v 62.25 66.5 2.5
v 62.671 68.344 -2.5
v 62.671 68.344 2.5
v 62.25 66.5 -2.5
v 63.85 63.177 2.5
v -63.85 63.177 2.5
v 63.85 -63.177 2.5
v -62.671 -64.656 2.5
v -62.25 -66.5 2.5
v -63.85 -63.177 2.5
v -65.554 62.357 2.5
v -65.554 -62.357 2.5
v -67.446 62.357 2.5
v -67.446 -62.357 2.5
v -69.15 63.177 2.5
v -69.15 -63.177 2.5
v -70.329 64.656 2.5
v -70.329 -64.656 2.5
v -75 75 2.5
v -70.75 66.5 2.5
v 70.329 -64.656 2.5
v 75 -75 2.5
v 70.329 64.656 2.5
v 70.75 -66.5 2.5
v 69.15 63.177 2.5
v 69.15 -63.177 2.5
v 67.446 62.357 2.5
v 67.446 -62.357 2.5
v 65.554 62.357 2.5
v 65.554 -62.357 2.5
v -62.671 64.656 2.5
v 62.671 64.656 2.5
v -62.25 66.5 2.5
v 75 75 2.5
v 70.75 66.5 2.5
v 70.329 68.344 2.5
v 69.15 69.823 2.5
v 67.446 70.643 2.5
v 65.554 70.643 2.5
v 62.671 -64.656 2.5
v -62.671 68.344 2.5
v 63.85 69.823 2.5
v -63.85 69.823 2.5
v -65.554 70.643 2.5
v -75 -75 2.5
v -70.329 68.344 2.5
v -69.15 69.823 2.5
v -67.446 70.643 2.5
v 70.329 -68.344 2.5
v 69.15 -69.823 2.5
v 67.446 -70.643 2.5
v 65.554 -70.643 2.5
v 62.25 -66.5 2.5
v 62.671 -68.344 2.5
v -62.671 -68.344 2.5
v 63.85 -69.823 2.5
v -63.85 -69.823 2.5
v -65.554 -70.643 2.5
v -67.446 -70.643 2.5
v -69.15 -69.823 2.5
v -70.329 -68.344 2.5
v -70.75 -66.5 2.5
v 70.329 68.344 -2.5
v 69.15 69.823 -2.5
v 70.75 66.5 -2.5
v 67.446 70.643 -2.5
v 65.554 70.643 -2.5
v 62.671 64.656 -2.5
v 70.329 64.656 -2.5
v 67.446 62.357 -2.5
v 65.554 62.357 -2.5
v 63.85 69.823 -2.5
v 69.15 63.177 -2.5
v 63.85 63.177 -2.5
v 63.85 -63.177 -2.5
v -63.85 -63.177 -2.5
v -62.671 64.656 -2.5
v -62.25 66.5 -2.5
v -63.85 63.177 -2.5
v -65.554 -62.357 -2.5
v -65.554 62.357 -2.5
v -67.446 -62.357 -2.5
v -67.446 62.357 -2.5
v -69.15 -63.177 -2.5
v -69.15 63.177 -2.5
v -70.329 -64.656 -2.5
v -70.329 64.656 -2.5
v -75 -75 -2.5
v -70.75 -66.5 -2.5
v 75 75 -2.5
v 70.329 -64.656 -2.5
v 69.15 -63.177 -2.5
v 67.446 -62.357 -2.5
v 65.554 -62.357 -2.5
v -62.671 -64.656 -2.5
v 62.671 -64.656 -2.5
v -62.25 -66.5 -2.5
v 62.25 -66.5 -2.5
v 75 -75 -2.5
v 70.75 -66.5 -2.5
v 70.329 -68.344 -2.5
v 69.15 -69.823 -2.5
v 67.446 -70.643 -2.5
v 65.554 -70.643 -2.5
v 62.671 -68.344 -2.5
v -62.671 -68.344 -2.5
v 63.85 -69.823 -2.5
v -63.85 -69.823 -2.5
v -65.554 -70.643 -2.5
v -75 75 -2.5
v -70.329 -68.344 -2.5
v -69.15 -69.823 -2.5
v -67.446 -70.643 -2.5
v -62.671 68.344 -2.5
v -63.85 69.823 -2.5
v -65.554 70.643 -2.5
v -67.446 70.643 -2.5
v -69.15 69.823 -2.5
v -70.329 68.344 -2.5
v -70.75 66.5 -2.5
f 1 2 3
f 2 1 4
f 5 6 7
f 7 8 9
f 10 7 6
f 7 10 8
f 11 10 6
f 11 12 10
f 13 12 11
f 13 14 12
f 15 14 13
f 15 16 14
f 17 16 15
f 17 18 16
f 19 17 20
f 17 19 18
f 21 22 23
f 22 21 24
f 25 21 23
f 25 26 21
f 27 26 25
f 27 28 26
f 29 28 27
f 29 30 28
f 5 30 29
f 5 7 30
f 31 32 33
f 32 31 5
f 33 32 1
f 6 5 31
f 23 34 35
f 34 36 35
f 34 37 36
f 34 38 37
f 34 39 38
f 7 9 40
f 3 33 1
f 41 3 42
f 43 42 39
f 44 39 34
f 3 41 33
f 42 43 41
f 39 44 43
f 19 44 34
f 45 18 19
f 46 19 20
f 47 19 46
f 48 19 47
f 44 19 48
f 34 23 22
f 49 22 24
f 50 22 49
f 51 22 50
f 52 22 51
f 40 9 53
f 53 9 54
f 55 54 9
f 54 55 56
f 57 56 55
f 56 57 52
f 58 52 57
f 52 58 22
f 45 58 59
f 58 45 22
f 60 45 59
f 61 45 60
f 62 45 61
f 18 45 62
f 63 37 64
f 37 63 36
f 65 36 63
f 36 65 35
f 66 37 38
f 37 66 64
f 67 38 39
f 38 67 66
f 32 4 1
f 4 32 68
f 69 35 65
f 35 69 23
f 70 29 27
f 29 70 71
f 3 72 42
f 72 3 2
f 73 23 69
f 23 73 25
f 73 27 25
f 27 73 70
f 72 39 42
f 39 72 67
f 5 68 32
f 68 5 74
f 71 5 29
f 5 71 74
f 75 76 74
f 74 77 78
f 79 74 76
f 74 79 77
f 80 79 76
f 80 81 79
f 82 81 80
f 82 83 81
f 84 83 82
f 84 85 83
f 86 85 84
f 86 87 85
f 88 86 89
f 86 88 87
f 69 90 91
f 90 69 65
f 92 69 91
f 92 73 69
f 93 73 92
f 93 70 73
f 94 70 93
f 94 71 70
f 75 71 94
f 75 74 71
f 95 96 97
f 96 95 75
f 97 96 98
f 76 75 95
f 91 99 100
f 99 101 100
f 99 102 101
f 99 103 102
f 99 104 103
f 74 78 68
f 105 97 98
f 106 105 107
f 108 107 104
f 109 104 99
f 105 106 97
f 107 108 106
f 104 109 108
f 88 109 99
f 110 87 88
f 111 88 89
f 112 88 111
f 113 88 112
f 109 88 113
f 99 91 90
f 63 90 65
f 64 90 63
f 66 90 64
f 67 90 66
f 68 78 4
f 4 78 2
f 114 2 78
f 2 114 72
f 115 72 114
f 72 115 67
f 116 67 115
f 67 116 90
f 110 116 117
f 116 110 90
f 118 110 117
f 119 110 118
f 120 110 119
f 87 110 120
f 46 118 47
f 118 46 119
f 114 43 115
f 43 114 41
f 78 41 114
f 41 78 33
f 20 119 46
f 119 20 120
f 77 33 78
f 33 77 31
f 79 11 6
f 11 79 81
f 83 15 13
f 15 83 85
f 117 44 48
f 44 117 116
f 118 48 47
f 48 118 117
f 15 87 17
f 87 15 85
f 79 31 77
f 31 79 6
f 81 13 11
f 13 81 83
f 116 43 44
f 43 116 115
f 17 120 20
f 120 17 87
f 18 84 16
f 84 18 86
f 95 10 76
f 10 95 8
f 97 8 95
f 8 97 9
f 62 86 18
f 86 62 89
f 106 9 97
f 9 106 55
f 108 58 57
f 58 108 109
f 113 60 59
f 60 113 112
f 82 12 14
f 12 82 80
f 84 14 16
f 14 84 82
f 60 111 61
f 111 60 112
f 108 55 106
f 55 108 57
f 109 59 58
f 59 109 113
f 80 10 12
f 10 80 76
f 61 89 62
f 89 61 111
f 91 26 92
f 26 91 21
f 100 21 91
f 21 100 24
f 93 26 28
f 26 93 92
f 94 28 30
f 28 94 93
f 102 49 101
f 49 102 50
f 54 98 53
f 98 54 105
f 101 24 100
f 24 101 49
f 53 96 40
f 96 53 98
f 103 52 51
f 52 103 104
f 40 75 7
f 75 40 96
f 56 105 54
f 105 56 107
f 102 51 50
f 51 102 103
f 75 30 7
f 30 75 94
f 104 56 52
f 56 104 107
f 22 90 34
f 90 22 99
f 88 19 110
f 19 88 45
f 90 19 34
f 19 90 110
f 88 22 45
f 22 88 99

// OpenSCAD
// Generated by SolidPython 1.1.3 on 2023-12-09 18:50:50


difference() {
	cube(center = true, size = [150, 150, 5]);
	union() {
		translate(v = [66.5000000000, 66.5000000000]) {
			cylinder(center = true, h = 5, r = 4.2500000000);
		}
		translate(v = [-66.5000000000, 66.5000000000]) {
			cylinder(center = true, h = 5, r = 4.2500000000);
		}
		translate(v = [-66.5000000000, -66.5000000000]) {
			cylinder(center = true, h = 5, r = 4.2500000000);
		}
		translate(v = [66.5000000000, -66.5000000000]) {
			cylinder(center = true, h = 5, r = 4.2500000000);
		}
	}
}
/***********************************************
*********      SolidPython code:      **********
************************************************
 
import solid
import numbers
import pudb
from solid.utils import *
import viewscad
import subprocess
import os
import os.path as osp
import math
import sys

chamfer_extrude=solid.import_scad("./chamfer_extrude.scad")
chamfer_extrude=chamfer_extrude.chamfer_extrude
r = viewscad.Renderer(width=800, height=800)

def debug(model,f_name,path="/home/ts/code/projects/mfd/designs/debug"):
    solid.scad_render_to_file(model,osp.join(path,f_name)+".scad")
#generate position list of wells using offset from center
wells_pos_from_center_4 = lambda offset: [[-offset,offset],
                                        [offset, offset],
                                        [-offset, -offset],
                                        [offset, -offset]]
#wells_pos_from_center_2 = lambda offset: [[0,offset],
#                                        [0, -offset]]
wells_pos_from_center_2 = lambda offset: [[offset,0],
                                        [-offset,0]]

def make_well(dims,shape=None,height=None,dxf=False):
    def circle_cylinder():
        if dxf or (height is None):
            well = solid.circle(r=dims, segments=64)
        else:
            well = solid.cylinder(r=dims, h=height, segments=64, center = True)
        return well
    if dims is None:
        sys.exit("radius needs to be a number")
    if isinstance(dims, numbers.Number):
        well =circle_cylinder()
    elif len(dims)==1:
        if isinstance(dims[1], numbers.Number):
            well =circle_cylinder()
        else:
            sys.exit("radius needs to be a number")
    elif len(dims)==2:
        well = solid.square(dims,center = True)
    elif len(dims)==3:
        well = solid.cube(dims, center = True)
    return well

def wells_top_bottom(center_gap,device_dims=None,shape=None,height=None, positions = None, dxf = False,well_shape=None):
    if well_shape == None:
        well_shape = make_well(device_dims,shape=shape,height=height,dxf=dxf)
    wells = []
    if positions is None:
        offset = radius+radius/2.0
        positions = wells_pos_from_center_2(offset)
    if dxf or (height is None):
        height = 0
    for position in positions:
        if dxf:
            wells.append(solid.translate([position[0],position[1]])(well_shape))
        else:
            wells.append(solid.translate([position[0],position[1],height/2.0])(well_shape))
    return  union()(*wells)

#place wells in four corners 
def four_corner(radius,height=None, positions = None, dxf = False):
    #if well pos not specified set
    #to equally spaced by half radius
    if positions is None:
        offset = radius+radius/2.0
        positions = wells_pos_from_center_4(offset)
    if dxf or (height is None):
        height = 0
    #make wells at positions with specified radius and height
    wells = []
    for position in positions:
        #make circle if making dxf
        if dxf:
            well_shape = solid.circle(r=radius, segments=64)
            well_shape = solid.translate([position[0],position[1]])(well_shape)
        #if stl make cylinder
        else:
            well_shape = solid.cylinder(r=radius, h=height, segments=64, center = True)
            well_shape = solid.translate([position[0],position[1],height/2.0])(well_shape)
        wells.append(well_shape)
    return  union()(*wells)

#generate channels 
def make_channels(length,width,height=0,num_chans=1,max_chans=None,spacing=None, dxf = False,
                  rotate_channels=False):
    if dxf or (height is None):
        height = 0
    #if channel gap not defined, is equal to
    if spacing is None: spacing = width
    #calculate number of channels if fitting max num within given width
    if not max_chans is None:
        import math
        num_chans = math.floor((max_chans-spacing)/(width+spacing))
    #get total width of channel section  
    total_width = (width*num_chans)+(spacing*(num_chans-1))

    #make template channel
    #if rotate_channels: width, length = length, width
    if dxf:
        channel_t = solid.square([length,width],center = True)
    else:
        channel_t = solid.cube([length,width,height], center = True)

    #if number channels is even, offset the first channel to center its gap
    if num_chans % 2 == 0: centering = -(width/2.0+spacing/2.0)
    else: centering = 0
    #move template channel up to align bottom at z = 0 
    #and offset center if necessary
    if dxf:
        channel_t = solid.translate([0,centering])(channel_t)
    else:
        channel_t = solid.translate([0,centering,height/2.0])(channel_t)

    #if rotate_channels: length,width = width,length
    #start making the channels
    channels = []
    for i in range(num_chans):
        #if i=0 there is no translation
        #if i=1, we make the first channel adjacent to second
        direction = i

        #if i>=1, we add channels alternating left and right
        if i >= 1:
            direction = -(i/2.0)
            if i % 2 == 1: direction = (-direction)+0.5
                
        #make channel at right position and add it to channel list
        translation_coords = [0,direction*(width+spacing)]
        #if rotate_channels: translation_coords = [direction*(width+spacing),0]
        if dxf:
            channel = solid.translate(translation_coords)(channel_t)
        else:
            channel = solid.translate([*translation_coords,0])(channel_t)
        channels.append(channel)
    
    #group all channels as one object
    channels = union()(*channels)
    #compute the x,y,z dimensions in order to pass as arguments 
    #for construction of other parts of device (such as the chambers)
    measurements = {'x':(length/2.0,-length/2.0),
                    'y':(total_width/2.0,-total_width/2.0)}
    if not dxf:
        measurements['z'] = (height,0)
    if rotate_channels:
        channels = solid.rotate(90)(channels)
        measurements['x'],measurements['y']=measurements['y'],measurements['x']
    return channels,measurements

def make_chambers(msrs,height=None,extra=0,len_until=None,width=None, dxf = False):
    #computes x,y,z length
    total = lambda x : abs(x[0]) + abs(x[1])
    
    #if specific height if specified
    #otherwise use same height as channels
    if dxf:
        pass
    elif not height is None:
        msrs['z'] = (height,0)
    else:
        msrs['z'] = (0,0)
        
    #make copy of measurements from channels to modify chamber dimensions 
    #and add length to chambers as specified
    chamber_dims = msrs.copy()
    #calculate length of chamber to reach specified offset
    if not len_until is None:
        chamber_len = len_until-(msrs['x'][0])
    #or add specified length to channel length (if not specified, adds 0)
    else:
        chamber_len = msrs['x'][0]+extra
    #set the chamber length based 
    chamber_dims['x'] = (chamber_len/2.0,-(chamber_len/2.0))
    #compute final dimensions of chamber
    if not width is None:
        chamber_dims['y'] = (width/2.0,-width/2.0)
    chamber_dims = [total(size) for size in chamber_dims.values()]
        
    #calculate chamber translation offset to place adjacent to channels
    chamber_trslt = msrs['x'][0]+(chamber_len/2.0)
    #compute chamber translation coordinates to align with channels
    #x = 1 moves chamber above channels
    #x = -1 moves chamber below channels
    if dxf:
        trslt = lambda x : [x*(chamber_trslt),0]
    else:
        trslt = lambda x : [x*(chamber_trslt),0,msrs['z'][0]/2.0]
    
    #function to make chamber at top or at bottom 
    if dxf:
        move = lambda x : solid.translate(trslt(x))(solid.square(chamber_dims, center = True) )
    else:
        move = lambda x : solid.translate(trslt(x))(solid.cube(chamber_dims,center = True))
    #make top and bottom chambers and return them as grouped
    top = move(1)
    bottom = move(-1)
    #chambers=solid.rotate(90)(solid.union()(top,bottom))
    chambers=(solid.union()(top,bottom))

    return chambers

#create alignment features 
def alignment_features(unit,dims,grid_size, mask_size = None, alignment = "hollow", units_from_center = (2.5,2.5), corner_len=None):
    width = grid_size[0]*dims[0]
    length = grid_size[1]*dims[1]
    if mask_size is None and corner_len is None:
        corner_len = (dims[0] + dims[1]) /2 / 8
    corner = lambda thickness_div : solid.union()( solid.square([corner_len,corner_len/thickness_div],center=False), solid.square([corner_len/thickness_div,corner_len],center=False) )
    
    def make_full(thickness_div):
        thickness = corner_len/thickness_div
        tr = solid.translate([0, 0, 0 ])(solid.rotate(180)(corner(thickness_div)))
        tr = solid.translate([thickness/2,thickness/2,0])(tr)
        bl = solid.translate([0, 0, 0 ])(solid.rotate(0)(corner(thickness_div)))
        bl = solid.translate([-thickness/2,-thickness/2,0])(bl)
        return solid.union()(tr,bl)
    
    def make_hollow(thickness_div):
        thickness = corner_len/(thickness_div/2)
        inner = make_full(thickness_div)
        outer = make_full(thickness_div/2)
        hollow = outer - inner 
        return hollow
    
    center = (width /2 , length/2)
    mask_pos = lambda x,y : (center[0] + x*(float(units_from_center[0])*dims[0]), center[1] + y*(float(units_from_center[1])*dims[1]))
    positions = []
    positions.append(mask_pos(1,0))
    positions.append(mask_pos(0,1))
    positions.append(mask_pos(-1,0))
    positions.append(mask_pos(0,-1))
    make_mask = lambda mtype : make_hollow(8) if mtype == "hollow" else make_full(8)
    masks = [ solid.translate([*position,0])(make_mask(alignment)) for position in positions]
    
    solid.scad_render_to_file(solid.union()(*masks),"./designs/open_chamber/masks.scad")
    #return unit - solid.union()(*masks)
    return solid.union()(*masks,unit)

def create_outline(thickness, array, dims, grid_size,):
    width = grid_size[0]*dims[0] + thickness *2
    length = grid_size[1]*dims[1] + thickness *2
    outer = solid.translate([-thickness, -thickness,0])(solid.square([width, length]))
    return outer-array

def create_wall(wall_thickness, outline_thickness, dims, grid_size, wall_height = 2000, dxf = False):
    inner_width = grid_size[0]*dims[0] + outline_thickness *2
    inner_length = grid_size[1]*dims[1] + outline_thickness *2
    outer_width = inner_width + wall_thickness * 2
    outer_length = inner_length + wall_thickness * 2
    outer_pos_x = -outline_thickness-wall_thickness
    outer_pos_y = -outline_thickness-wall_thickness
    inner_pos_x = -outline_thickness
    inner_pos_y = -outline_thickness
    if dxf:
        inner_wall = solid.translate([inner_pos_x,
                                      inner_pos_y,
                                      0])(solid.square([inner_width, inner_length]))
        outer_wall = solid.translate([outer_pos_x,
                                      outer_pos_y,
                                      0])(solid.square([outer_width, outer_length]))

        return outer_wall-inner_wall
    else:
        inner_wall = solid.translate([inner_pos_x,
                                      inner_pos_y,
                                      0])(solid.cube([inner_width, inner_length,wall_height]))
        outer_wall = solid.translate([outer_pos_x,
                                      outer_pos_y,
                                      0])(solid.cube([outer_width, outer_length,wall_height]))

        return outer_wall-inner_wall, {'wall_height': wall_height,
                                       'wall_thickness': wall_thickness,
                                       'inner_width':inner_width,
                                       'inner_length': inner_length,
                                       'outer_width': outer_width,
                                       'outer_length': outer_length,
                                       'outer_pos_x' : outer_pos_x,
                                       'outer_pos_y' : outer_pos_y,
                                       'inner_pos_x' : inner_pos_x,
                                       'inner_pos_y' : inner_pos_y}

def create_thicker_wall(wall_thickness, outer_wall_offset, wall_dims, dims, grid_size, height_start = .2, height_end=2, dxf = False):
    addon_wall,thicker_wall_dims = create_wall(wall_thickness, outer_wall_offset, dims, grid_size, wall_height=height_end-height_start, dxf = False)
    addon_wall = solid.translate([0,0,height_start])(addon_wall)

    thicker_wall_dims['wall_height'] = height_end
    thicker_wall_dims['wall_thickness'] = wall_dims['wall_thickness'] + wall_thickness
    return addon_wall, thicker_wall_dims
 
def add_lock_to_wall(wall,wall_dims,y_offset = 0,cut_ratio=0.7,L_length=3, gap_ratio=0.05, axis="x",width_ratio=1/2):
    # Makes L shape
    def make_L(max_length,length_thickness,max_width,width_thickness,height,y_offset):
        length = solid.cube([max_length,length_thickness,height])
        width = solid.cube([width_thickness,max_width,height])
        width = solid.translate([max_length-(width_thickness),0,0])(width)
        L = solid.union()(width,length)
        debug(L,"L")
        if axis == "x":
            L = solid.rotate(-90)(L)
            L = solid.translate([0,max_length,0])(L)
        else:
            L = solid.rotate(-180)(L)
            L = solid.translate([max_length,max_width,0])(L)
        return solid.translate([0,0,y_offset])(L)
    
    lock_length = L_length
    lock_width = wall_dims['wall_thickness']*width_ratio
    lock_length_thickness = lock_width/2
    lock_width_thickness = lock_width/2
    L_lock = make_L(lock_length,lock_length_thickness,lock_width,lock_width_thickness, wall_dims['wall_height']-y_offset, y_offset)
    
    margin_space = lock_length - lock_length*(1-gap_ratio)
    key_length = lock_length-margin_space
    key_length_thickness = lock_length_thickness-(margin_space*2)
    key_width = lock_width-(margin_space*2)
    key_width_thickness = lock_width_thickness-(margin_space*2)
    L_key = make_L(key_length,key_length_thickness,key_width,key_width_thickness, wall_dims['wall_height']-y_offset, y_offset)
    L_key = solid.translate([margin_space,margin_space,0])(L_key)
    L = solid.union()(L_lock,L_key)
    debug(L,"L")
    
    #Make cube to be used as negative to split frame in a half
    #Can choose if making left or right negative, specify ratio of split
    def make_negative(right,cut_ratio):
        if axis == "x":
            if right:
                length = wall_dims['outer_length']*(1-cut_ratio)
                pos_x = wall_dims['outer_pos_x']+(wall_dims['outer_length']*cut_ratio)
            else:
                length = wall_dims['outer_length']*(cut_ratio)
                pos_x = wall_dims['outer_pos_x'] 
            negative = solid.cube([wall_dims['outer_width'],length, wall_dims['wall_height']])
            negative = solid.translate([wall_dims['outer_pos_y'],pos_x,0])(negative)
        else:
            if right:
                length = wall_dims['outer_width']*(1-cut_ratio)
                pos_x = wall_dims['outer_pos_y']+(wall_dims['outer_width']*cut_ratio)
            else:
                length = wall_dims['outer_width']*(cut_ratio)
                pos_x = wall_dims['outer_pos_y'] 
            negative = solid.cube([length,wall_dims['outer_length'], wall_dims['wall_height']])
            negative = solid.translate([pos_x,wall_dims['outer_pos_x'],0])(negative)
        return negative, pos_x, length 
                      
    #Make negatives
    negative_right, right_half_pos_x, right_half_length = make_negative(True,cut_ratio)
    negative_left, left_half_pos_x, right_half_length = make_negative(False,cut_ratio)
    #Make halves
    left_half = solid.difference()(wall,negative_right)
    right_half = solid.difference()(wall,negative_left)
    def place_L(L, L_length,L_width):
        #Place L on top wall       
        offset_to_center = (wall_dims['wall_thickness']-L_width)/2
        if axis == "x":
            y_pos_top = (wall_dims['outer_pos_y'] +
                    wall_dims['outer_width'] - 
                    L_width - offset_to_center)
            top_L = solid.translate([y_pos_top,
                                     right_half_pos_x-(L_length),
                                     0])(L)
            #Place L on bottom wall       
            y_pos_bottom = wall_dims['outer_pos_y']+offset_to_center
            bottom_L = solid.translate([y_pos_bottom,
                                        right_half_pos_x-L_length,
                                        0])(L)
        else:
            y_pos_top = (wall_dims['outer_pos_x'] +
                    wall_dims['outer_length'] -
                    (L_width+offset_to_center))
            top_L = solid.translate([right_half_pos_x-L_length,
                                     y_pos_top,
                                     0])(L)
            #Place L on bottom wall       
            y_pos_bottom = wall_dims['outer_pos_y']+offset_to_center
            bottom_L = solid.translate([right_half_pos_x-L_length,
                                        y_pos_bottom,
                                        0])(L)
        return bottom_L, top_L
    #Make complimentary L pieces through union and differences
    #Make Lock
    bottom_L_lock, top_L_lock = place_L(L_lock,L_length,lock_width)
    left_half = solid.difference()(left_half,bottom_L_lock)
    left_half = solid.difference()(left_half,top_L_lock)
    #Make Key
    bottom_L_key, top_L_key = place_L(L_key,L_length,lock_width)
    right_half = solid.union()(right_half,bottom_L_key)
    right_half = solid.union()(right_half,top_L_key)
    return left_half, right_half


#build a row x col grid of containment units
def make_unit_array(unit,dims,grid_size, dxf = False, alignment = None, mask_size = None,
                    units_from_center = None,alignment_offset=None, alignment_mark_size=1):
    units = []
    for col in range(grid_size[1]):
        for row in range(grid_size[0]):
            if dxf:
                units.append(solid.translate([row*dims[0],col*dims[1]])(unit))
            else:
                units.append(solid.translate([row*dims[0],col*dims[1],dims[2]/2.0])(unit))
    array = solid.union()(*units)
    if (not alignment is None) and dxf:
        if not alignment_offset is None:
            array = solid.translate([alignment_offset[0],alignment_offset[1]])(array)
        array = alignment_features(array,dims, grid_size, alignment = alignment, mask_size = None, units_from_center = units_from_center,corner_len=alignment_mark_size)
        if not alignment_offset is None:
            array = solid.translate([-alignment_offset[0],-alignment_offset[1]])(array)
    return array


def make_taylor(wells_pos = wells_pos_from_center_4(2.25), well_rad = 1.5 ,
                well_height = 2, chan_w = 0.01, chan_l = 1, chan_h = 0.010 ,
                chan_gap = 0.040, max_chans = None,num_chans=100, chamber_height  = 0.100,
                columns = 1, rows = 1, chamber_len_until=2.25, add_channels = True, add_wells = True, 
                add_chambers = True, save_path = "./", alignment = None, units_from_center = 2,
                mask_size = None, render_stl = False, outline_thickness = 0.050, dxf = True,
                wall_height = 15, wall_thickness = 0.95, casing_x=9, casing_y=9, casing_z=0,rotate_units=0):

    dims = [casing_x, casing_y, casing_z]
    wells = four_corner(well_rad,well_height, dxf = dxf, positions = wells_pos)
    debug(wells,"wells")
    channels, msrs = make_channels(chan_l,chan_w,chan_h,dxf=dxf, spacing = chan_gap, max_chans=max_chans,num_chans=num_chans)
    debug(channels,"channels")
    chambers = make_chambers(msrs,dxf = dxf, height=chamber_height,len_until=chamber_len_until)
    debug(chambers,"chambers")

    #add together and render
    device_parts = []
    if add_channels:
        device_parts.append(channels)
    if add_wells:
        device_parts.append(wells)
    if add_chambers:
        device_parts.append(chambers)
    device=union()(*device_parts)
    device = rotate(rotate_units)(device)

    device=solid.translate([dims[0]/2.0,dims[1]/2.0,0])(device)
    channels = rotate(rotate_units)(channels)
    channels=solid.translate([dims[0]/2,dims[1]/2,0])(channels)
    chambers_wells = union()(wells,chambers)
    chambers_wells = rotate(rotate_units)(chambers_wells)
    chambers_wells=solid.translate([dims[0]/2,dims[1]/2,0])(chambers_wells)

    file_name = str(rows)+'x'+str(columns)+'_units_'
    grid_size = [rows,columns]

    if alignment:
        alignment="full"
    device = make_unit_array(device,dims,grid_size, dxf=dxf, alignment = alignment,
                                 units_from_center = units_from_center)
    channels = make_unit_array(channels,dims,grid_size, dxf=dxf, alignment = alignment,
                                 units_from_center = units_from_center)
    if alignment=="full":
        alignment="hollow"

    chambers_wells = make_unit_array(chambers_wells,dims,grid_size, dxf=dxf, alignment = alignment,
                                 units_from_center =units_from_center)

    def save_model(model,prefix):
        model_fname = os.path.abspath(save_path+prefix+"_"+file_name+".scad")
        solid.scad_render_to_file(model,model_fname)
        return model_fname

    wells_fname = save_model(wells,"wells")
    channels_fname = save_model(channels,"channels")
    device_fname = save_model(device,"device")
    chambers_wells_fname = save_model(chambers_wells,"chambers_wells")
    return (chambers_wells,chambers_wells_fname), (channels,channels_fname), (device,device_fname)

def make_device(design='open',rows=8,columns=6,wells_pos = 4.5,well_offset=3.2, well_rad=3.2,well_height=0.1,
                chan_l=1,chan_w=0.01,chan_h=0.01,chan_gap=0.015,num_chans=101,dxf=True,save_path="./designs/open_chamber/",
                casing_x=9.0,casing_y=18.0,casing_z=0,rotate_units=90,units_from_center=(3,1),chamber_len_until=4.5,
                chamber_width=None,alignment=True, add_wells=True, add_channels=True,add_chambers=True,well_shape=None):

    dims = [casing_x, casing_y, casing_z]
    if design == "open":
        wells_pos=wells_pos_from_center_2(wells_pos)
        wells = wells_top_bottom(well_offset*2,device_dims=well_rad,height=well_height, dxf = dxf, positions = wells_pos,well_shape=well_shape)
    elif design == "closed":
        wells_pos=wells_pos_from_center_4(wells_pos)
        debug(wells,"wells")
        wells = four_corner(well_offset,well_height,device_dims=well_rad, dxf = dxf, positions = wells_pos)
    else:
        print(design+" is not a valid design.\n Choose valid design: 'open' or 'closed'")
        exit()
    wells = rotate(rotate_units)(wells)
    wells=solid.translate([dims[0]/2,dims[1]/2,0])(wells)
    debug(wells,"wells")

    channels, msrs = make_channels(chan_l,chan_w,chan_h,dxf=dxf, spacing = chan_gap, num_chans=num_chans,rotate_channels=False)
    channels = rotate(rotate_units)(channels)
    channels=solid.translate([dims[0]/2,dims[1]/2,0])(channels)

    chambers=make_chambers(msrs,height=None,extra=0,len_until=chamber_len_until, width=chamber_width,dxf = dxf)
    chambers = rotate(rotate_units)(chambers)
    chambers=solid.translate([dims[0]/2,dims[1]/2,0])(chambers)

    device_parts = []
    if add_channels:
        device_parts.append(channels)
    if add_wells:
        device_parts.append(wells)
    if add_chambers:
        device_parts.append(chambers)
    device = union()(*device_parts)
    #device = rotate(rotate_units)(device)
    #device=solid.translate([dims[0]/2.0,dims[1]/2.0,0])(device)

    chambers_wells = []
    if add_chambers:
        chambers_wells.append(chambers)
    if add_wells:
        chambers_wells.append(wells)
    chambers_wells = union()(*chambers_wells)
    #chambers_wells = union()(wells,chambers)
    #chambers_wells = rotate(rotate_units)(chambers_wells)
    #chambers_wells=solid.translate([dims[0]/2,dims[1]/2,0])(chambers_wells)

    file_name = str(rows)+'x'+str(columns)+'_units_'

    grid_size = [rows,columns]
    if alignment:
        alignment="full"
    device = make_unit_array(device,dims,grid_size, dxf=dxf, alignment = alignment,
                                 units_from_center = units_from_center)
    channels = make_unit_array(channels,dims,grid_size, dxf=dxf, alignment = alignment,
                                 units_from_center = units_from_center)
    if alignment=="full":
        alignment="hollow"

    chambers_wells = make_unit_array(chambers_wells,dims,grid_size, dxf=dxf, alignment = alignment,
                                 units_from_center =units_from_center)

    def save_model(model,prefix):
        model_fname = os.path.abspath(save_path+prefix+"_"+file_name+".scad")
        solid.scad_render_to_file(model,model_fname)
        return model_fname

    wells_fname = save_model(wells,"wells")
    channels_fname = save_model(channels,"channels")
    device_fname = save_model(device,"device")
    chambers_wells_fname = save_model(chambers_wells,"chambers_wells")
    return (chambers_wells,chambers_wells_fname), (channels,channels_fname), (device,device_fname)


def make_open_chamber(rows=8,columns=6,wells_pos = wells_pos_from_center_2(4.5), well_rad=3.2,well_height=0.1,
                      chan_l=1,chan_w=0.01,chan_h=0.01,chan_gap=0.015,num_chans=101,dxf=True,save_path="./designs/open_chamber/",
                      casing_x=9.0,casing_y=18.0,casing_z=0,rotate_units=90,units_from_center=(3,1),chamber_len_until=4.5,
                      chamber_width=None,alignment=True, add_wells=True, add_channels=True,add_chambers=True,well_shape=None):

    dims = [casing_x, casing_y, casing_z]
    wells = wells_top_bottom(well_rad,height=well_height, dxf = dxf, positions = wells_pos, well_shape=well_shape)
    channels, msrs = make_channels(chan_l,chan_w,chan_h,dxf=dxf, spacing = chan_gap, num_chans=num_chans,rotate_channels=False)
    chambers=make_chambers(msrs,height=None,extra=0,len_until=chamber_len_until, width=chamber_width,dxf = dxf)
    debug(chambers,"chambers")
    device_parts = []
    if add_channels:
        device_parts.append(channels)
    if add_wells:
        device_parts.append(wells)
    if add_chambers:
        device_parts.append(chambers)
    device = union()(*device_parts)
    device = rotate(rotate_units)(device)
    device=solid.translate([dims[0]/2.0,dims[1]/2.0,0])(device)
    channels = rotate(rotate_units)(channels)
    channels=solid.translate([dims[0]/2,dims[1]/2,0])(channels)
    chambers_wells = union()(wells,chambers)
    chambers_wells = rotate(rotate_units)(chambers_wells)
    chambers_wells=solid.translate([dims[0]/2,dims[1]/2,0])(chambers_wells)

    file_name = str(rows)+'x'+str(columns)+'_units_'

    grid_size = [rows,columns]
    if alignment:
        alignment="full"
    device = make_unit_array(device,dims,grid_size, dxf=dxf, alignment = alignment,
                                 units_from_center = units_from_center)
    channels = make_unit_array(channels,dims,grid_size, dxf=dxf, alignment = alignment,
                                 units_from_center = units_from_center)
    if alignment=="full":
        alignment="hollow"

    chambers_wells = make_unit_array(chambers_wells,dims,grid_size, dxf=dxf, alignment = alignment,
                                 units_from_center =units_from_center)

    def save_model(model,prefix):
        model_fname = os.path.abspath(save_path+prefix+"_"+file_name+".scad")
        solid.scad_render_to_file(model,model_fname)
        return model_fname

    wells_fname = save_model(wells,"wells")
    channels_fname = save_model(channels,"channels")
    device_fname = save_model(device,"device")
    chambers_wells_fname = save_model(chambers_wells,"chambers_wells")
    return (chambers_wells,chambers_wells_fname), (channels,channels_fname), (device,device_fname)

def to_dxf(scad_path):
    dxf_path = scad_path.replace(".scad",".dxf")
    subprocess.call(["openscad", "-o", dxf_path, scad_path])
    import ezdxf
    temp_dxf = ezdxf.readfile(dxf_path)
    temp_dxf.saveas(dxf_path)

#def make_walls(diameter,thickness,grid_size,dims,height=20,segments=256,make_inner=True):
#    wafer_wall_out = solid.cylinder(r=diameter/2,h=height, segments=segments)
#    wafer_wall_in = solid.cylinder(r=(diameter/2-thickness),h=height, segments=segments)
#    wafer_wall = solid.difference()(wafer_wall_out,wafer_wall_in)
#    wafer_wall = solid.translate([grid_size[1]*dims[1]/2.0,grid_size[0]*dims[0]/2.0])(wafer_wall)
#
#    vertical_wall_length = grid_size[1]*dims[1]
#    horizontal_wall_length = grid_size[0]*dims[0]
#    vertical_wall = solid.cube([vertical_wall_length,thickness,height],center = True)
#    vertical_wall = solid.translate([vertical_wall_length/2,0,height/2])(vertical_wall)
#    horizontal_wall = solid.cube([thickness,horizontal_wall_length,height],center = True)
#    horizontal_wall = solid.translate([0,vertical_wall_length/2,height/2])(horizontal_wall)
#    walls = []
#    walls.append(horizontal_wall)
#    walls.append(vertical_wall)
#    for col in range(grid_size[1]):
#        if col == grid_size[1]-1: 
#            walls.append(solid.translate([0,(col+1)*dims[1]])(vertical_wall))
#        elif col > 0 and col < grid_size[1]-1 and make_inner==True:
#            walls.append(solid.translate([0,(col+1)*dims[1]])(vertical_wall))
#    for row in range(grid_size[0]):
#        if row == grid_size[0]-1: 
#            walls.append(solid.translate([(row+1)*dims[0],0])(horizontal_wall))
#        elif row > 0 and row < grid_size[0]-1 and make_inner==True:
#            walls.append(solid.translate([(row+1)*dims[0],0])(horizontal_wall))
#    walls = union()(*walls)
#    wafer_walls = union()(walls,wafer_wall)
#    return walls,wafer_wall,wafer_walls

def make_walls(diameter,thickness,grid_size,dims,height=20,segments=256,make_inner=True,padx=0,pady=0):
    wafer_wall_out = solid.cylinder(r=diameter/2,h=height, segments=segments)
    wafer_wall_in = solid.cylinder(r=(diameter/2-thickness),h=height, segments=segments)
    wafer_wall = solid.difference()(wafer_wall_out,wafer_wall_in)
    wafer_wall = solid.translate([grid_size[1]*dims[1]/2.0,grid_size[0]*dims[0]/2.0])(wafer_wall)

    vertical_wall_length = grid_size[0]*dims[0]+padx
    horizontal_wall_length = grid_size[1]*dims[1]+pady
    vertical_wall = solid.cube([vertical_wall_length,thickness,height],center = True)
    vertical_wall = solid.translate([vertical_wall_length/2-pady/2,-padx/2,height/2])(vertical_wall)
    horizontal_wall = solid.cube([thickness,horizontal_wall_length,height],center = True)
    horizontal_wall = solid.translate([-pady/2,horizontal_wall_length/2-padx/2,height/2])(horizontal_wall)
    walls = []
    walls.append(horizontal_wall)
    walls.append(vertical_wall)
    for col in range(grid_size[1]):
        if col == grid_size[1]-1: 
            walls.append(solid.translate([0,(col+1)*dims[1]+pady])(vertical_wall))
        elif col > 0 and col < grid_size[1]-1 and make_inner==True:
            walls.append(solid.translate([0,(col+1)*dims[1]])(vertical_wall))
    for row in range(grid_size[0]):
        if row == grid_size[0]-1: 
            walls.append(solid.translate([(row+1)*dims[0]+padx,0])(horizontal_wall))
        elif row > 0 and row < grid_size[0]-1 and make_inner==True:
            walls.append(solid.translate([(row+1)*dims[0],0])(horizontal_wall))
    walls = union()(*walls)
    wafer_walls = union()(walls,wafer_wall)
    return walls,wafer_wall,wafer_walls

def save_model(model,base_path,base_name,dxf=True):
    if not os.path.exists(base_path):
        os.makedirs(base_path)
    dxf_path=osp.join(base_path,base_name+".scad")
    solid.scad_render_to_file(model,osp.join(dxf_path))
    if dxf:
        to_dxf(dxf_path)

def make_wafer(diameter,flat_len,thickness):
    wafer = solid.cylinder(r1=diameter/2,r2=diameter/2,h=thickness,segments=512,)()
    x_start_flat=(flat_len/2)
    y_start_flat = math.sqrt(((diameter/2)**2) - (x_start_flat**2) )
    height_delete_flat=diameter/2-y_start_flat
    flat_delete = solid.cube([flat_len,height_delete_flat,thickness],center=False)()
    flat_delete = solid.translate([-flat_len/2,y_start_flat,0])(flat_delete)
    wafer = solid.difference()(wafer,flat_delete)
    wafer = solid.rotate(90)(wafer)
    return wafer

def add_wafer_to_mask(wafer_size,flat_len,mask,grid_size,dims,wafer_line_thickness=0.1,outer_mask_thickness=5,alignment_offset=None):
    def make_wafer_mask(wafer_size,flat_len):
        wafer_mask = make_wafer(wafer_size,flat_len,1)
        wafer_mask = solid.projection()(wafer_mask)
        wafer_mask = solid.translate([grid_size[0]*dims[0]/2.0,grid_size[1]*dims[1]/2.0])(wafer_mask)
        if not alignment_offset is None:
            wafer_mask = solid.translate([-alignment_offset[0],-alignment_offset[1]])(wafer_mask)
        return wafer_mask

    inner_wafer_line_mask = make_wafer_mask(wafer_size-wafer_line_thickness/2,flat_len)
    outer_wafer_line_mask = make_wafer_mask(wafer_size+wafer_line_thickness/2,flat_len)
    outer_wafer_mask = make_wafer_mask(wafer_size+outer_mask_thickness,flat_len)
    outer_wafer_mask = solid.difference()(outer_wafer_mask,outer_wafer_line_mask)
    wafer_mask = solid.union()(outer_wafer_mask,inner_wafer_line_mask)

    return solid.difference()(wafer_mask,mask)

def make_posts(post_shape,post_height):
    posts = solid.linear_extrude(height=post_height)(post_shape)
    return posts

def make_wafer_empty(diameter,flat_len,thickness,margin,notch_len=20,notch_height=5,oversize=1.01):
    diameter*=oversize
    flat_len*=oversize
    wafer = make_wafer(diameter,flat_len,thickness)
    holder = solid.cylinder(r1=diameter/2+margin,r2=diameter/2+margin,h=thickness,segments=512)()
    holder = solid.difference()(holder,wafer)

    x_start_flat=(flat_len/2)
    y_start_flat = math.sqrt(((diameter/2)**2) - (x_start_flat**2) )
    height_delete_flat=diameter/2-y_start_flat
    notch = solid.cube([notch_len,notch_height,thickness],center=False)()
    notch = solid.translate([-notch_len/2,y_start_flat,0])(notch)
    notch = solid.rotate(90)(notch)
    return solid.difference()(holder,notch)

def wafer_print_calibration(diameter,thickness,height,z_offset):
    circles = []
    radii = []
    radii.append(diameter/2.0*0.8)
    radii.append(diameter/2.0*0.6)
    radii.append(diameter/2.0*0.4)
    radii.append(diameter/2.0*0.2)
    for radius in radii:
        inner = solid.cylinder(r1=radius-(thickness/2.0),r2=radius-(thickness/2.0),h=thickness,segments=512,)()
        outer = solid.cylinder(r1=radius+(thickness/2.0),r2=radius+(thickness/2.0),h=thickness,segments=512,)()
        diff = solid.difference()(outer,inner)
        circles.append(diff)
    circles = solid.union()(*circles)
    circles = solid.translate([0,0,z_offset])(circles)
    return circles

def make_rack(wells,dims,grid_size,alignment_offset,rack_x,rack_y,rack_thickness,bolt_width,add_bolts=True):

    #get X and Y dimensions of gride of pipette tips
    X_len = dims[0]*grid_size[0]
    Y_len = dims[1]*grid_size[1]
    #make rack
    rack = solid.cube([rack_x,rack_y,rack_thickness],center=True)

    if add_bolts:
    #add bolt holes
        bolt_hole=solid.cylinder(r=bolt_width/2,h=rack_thickness,center=True)()
        bolt_holes = []
        bolt_holes.append(solid.translate([rack_x/2-1.5*bolt_width,rack_y/2-1.5*bolt_width])(bolt_hole))
        bolt_holes.append(solid.translate([-rack_x/2+1.5*bolt_width,rack_y/2-1.5*bolt_width])(bolt_hole))
        bolt_holes.append(solid.translate([-rack_x/2+1.5*bolt_width,-rack_y/2+1.5*bolt_width])(bolt_hole))
        bolt_holes.append(solid.translate([rack_x/2-1.5*bolt_width,-rack_y/2+1.5*bolt_width])(bolt_hole))
        bolt_holes = solid.union()(*bolt_holes)
        rack=solid.difference()(rack,bolt_holes)
    rack_support = rack

    #center rack with pipette holes
    rack = solid.translate([0,0,rack_thickness/2])(rack)
    rack = solid.translate([X_len/2,Y_len/2])(rack)
    rack = solid.translate([-alignment_offset[0],-alignment_offset[1]])(rack)
    wells = solid.linear_extrude(height=rack_thickness)(wells)
    rack = solid.difference()(rack,wells)
    return rack, rack_support

def make_pillar(wells,dims,grid_size,alignment_offset,rack_x,rack_y,pillar_height,rack_thickness,bolt_width,add_bolts=True,taper_angle=1,bolt_position_corner=1.5):

    #get X and Y dimensions of gride of pipette tips
    X_len = dims[0]*grid_size[0]
    Y_len = dims[1]*grid_size[1]
    #make rack
    rack = solid.cube([rack_x,rack_y,rack_thickness],center=True)
    
    if add_bolts:
    #add bolt holes
        bolt_hole=solid.cylinder(r=bolt_width/2,h=rack_thickness,center=True)()
        bolt_holes = []
        bolt_holes.append(solid.translate([rack_x/2-bolt_position_corner*bolt_width,rack_y/2-bolt_position_corner*bolt_width])(bolt_hole))
        bolt_holes.append(solid.translate([-rack_x/2+bolt_position_corner*bolt_width,rack_y/2-bolt_position_corner*bolt_width])(bolt_hole))
        bolt_holes.append(solid.translate([-rack_x/2+bolt_position_corner*bolt_width,-rack_y/2+bolt_position_corner*bolt_width])(bolt_hole))
        bolt_holes.append(solid.translate([rack_x/2-bolt_position_corner*bolt_width,-rack_y/2+bolt_position_corner*bolt_width])(bolt_hole))
        bolt_holes = solid.union()(*bolt_holes)
        rack=solid.difference()(rack,bolt_holes)
    rack_support = rack

    #center rack with pipette holes
    #rack = solid.translate([0,0,-rack_thickness])(rack)
    rack = solid.translate([X_len/2,Y_len/2])(rack)
    rack = solid.translate([-alignment_offset[0],-alignment_offset[1]])(rack)
    if not taper_angle == 0:
        wells=chamfer_extrude(pillar_height,taper_angle,segments=20)(wells)
    else:
        wells = solid.linear_extrude(height=pillar_height)(wells)
    rack = solid.union()(rack,wells)
    return rack, rack_support

def deg_taper_len(height,deg):
    if not deg == 0:
        return height*math.tan(math.radians(deg))
    else:
        return 0









 
 
************************************************/
